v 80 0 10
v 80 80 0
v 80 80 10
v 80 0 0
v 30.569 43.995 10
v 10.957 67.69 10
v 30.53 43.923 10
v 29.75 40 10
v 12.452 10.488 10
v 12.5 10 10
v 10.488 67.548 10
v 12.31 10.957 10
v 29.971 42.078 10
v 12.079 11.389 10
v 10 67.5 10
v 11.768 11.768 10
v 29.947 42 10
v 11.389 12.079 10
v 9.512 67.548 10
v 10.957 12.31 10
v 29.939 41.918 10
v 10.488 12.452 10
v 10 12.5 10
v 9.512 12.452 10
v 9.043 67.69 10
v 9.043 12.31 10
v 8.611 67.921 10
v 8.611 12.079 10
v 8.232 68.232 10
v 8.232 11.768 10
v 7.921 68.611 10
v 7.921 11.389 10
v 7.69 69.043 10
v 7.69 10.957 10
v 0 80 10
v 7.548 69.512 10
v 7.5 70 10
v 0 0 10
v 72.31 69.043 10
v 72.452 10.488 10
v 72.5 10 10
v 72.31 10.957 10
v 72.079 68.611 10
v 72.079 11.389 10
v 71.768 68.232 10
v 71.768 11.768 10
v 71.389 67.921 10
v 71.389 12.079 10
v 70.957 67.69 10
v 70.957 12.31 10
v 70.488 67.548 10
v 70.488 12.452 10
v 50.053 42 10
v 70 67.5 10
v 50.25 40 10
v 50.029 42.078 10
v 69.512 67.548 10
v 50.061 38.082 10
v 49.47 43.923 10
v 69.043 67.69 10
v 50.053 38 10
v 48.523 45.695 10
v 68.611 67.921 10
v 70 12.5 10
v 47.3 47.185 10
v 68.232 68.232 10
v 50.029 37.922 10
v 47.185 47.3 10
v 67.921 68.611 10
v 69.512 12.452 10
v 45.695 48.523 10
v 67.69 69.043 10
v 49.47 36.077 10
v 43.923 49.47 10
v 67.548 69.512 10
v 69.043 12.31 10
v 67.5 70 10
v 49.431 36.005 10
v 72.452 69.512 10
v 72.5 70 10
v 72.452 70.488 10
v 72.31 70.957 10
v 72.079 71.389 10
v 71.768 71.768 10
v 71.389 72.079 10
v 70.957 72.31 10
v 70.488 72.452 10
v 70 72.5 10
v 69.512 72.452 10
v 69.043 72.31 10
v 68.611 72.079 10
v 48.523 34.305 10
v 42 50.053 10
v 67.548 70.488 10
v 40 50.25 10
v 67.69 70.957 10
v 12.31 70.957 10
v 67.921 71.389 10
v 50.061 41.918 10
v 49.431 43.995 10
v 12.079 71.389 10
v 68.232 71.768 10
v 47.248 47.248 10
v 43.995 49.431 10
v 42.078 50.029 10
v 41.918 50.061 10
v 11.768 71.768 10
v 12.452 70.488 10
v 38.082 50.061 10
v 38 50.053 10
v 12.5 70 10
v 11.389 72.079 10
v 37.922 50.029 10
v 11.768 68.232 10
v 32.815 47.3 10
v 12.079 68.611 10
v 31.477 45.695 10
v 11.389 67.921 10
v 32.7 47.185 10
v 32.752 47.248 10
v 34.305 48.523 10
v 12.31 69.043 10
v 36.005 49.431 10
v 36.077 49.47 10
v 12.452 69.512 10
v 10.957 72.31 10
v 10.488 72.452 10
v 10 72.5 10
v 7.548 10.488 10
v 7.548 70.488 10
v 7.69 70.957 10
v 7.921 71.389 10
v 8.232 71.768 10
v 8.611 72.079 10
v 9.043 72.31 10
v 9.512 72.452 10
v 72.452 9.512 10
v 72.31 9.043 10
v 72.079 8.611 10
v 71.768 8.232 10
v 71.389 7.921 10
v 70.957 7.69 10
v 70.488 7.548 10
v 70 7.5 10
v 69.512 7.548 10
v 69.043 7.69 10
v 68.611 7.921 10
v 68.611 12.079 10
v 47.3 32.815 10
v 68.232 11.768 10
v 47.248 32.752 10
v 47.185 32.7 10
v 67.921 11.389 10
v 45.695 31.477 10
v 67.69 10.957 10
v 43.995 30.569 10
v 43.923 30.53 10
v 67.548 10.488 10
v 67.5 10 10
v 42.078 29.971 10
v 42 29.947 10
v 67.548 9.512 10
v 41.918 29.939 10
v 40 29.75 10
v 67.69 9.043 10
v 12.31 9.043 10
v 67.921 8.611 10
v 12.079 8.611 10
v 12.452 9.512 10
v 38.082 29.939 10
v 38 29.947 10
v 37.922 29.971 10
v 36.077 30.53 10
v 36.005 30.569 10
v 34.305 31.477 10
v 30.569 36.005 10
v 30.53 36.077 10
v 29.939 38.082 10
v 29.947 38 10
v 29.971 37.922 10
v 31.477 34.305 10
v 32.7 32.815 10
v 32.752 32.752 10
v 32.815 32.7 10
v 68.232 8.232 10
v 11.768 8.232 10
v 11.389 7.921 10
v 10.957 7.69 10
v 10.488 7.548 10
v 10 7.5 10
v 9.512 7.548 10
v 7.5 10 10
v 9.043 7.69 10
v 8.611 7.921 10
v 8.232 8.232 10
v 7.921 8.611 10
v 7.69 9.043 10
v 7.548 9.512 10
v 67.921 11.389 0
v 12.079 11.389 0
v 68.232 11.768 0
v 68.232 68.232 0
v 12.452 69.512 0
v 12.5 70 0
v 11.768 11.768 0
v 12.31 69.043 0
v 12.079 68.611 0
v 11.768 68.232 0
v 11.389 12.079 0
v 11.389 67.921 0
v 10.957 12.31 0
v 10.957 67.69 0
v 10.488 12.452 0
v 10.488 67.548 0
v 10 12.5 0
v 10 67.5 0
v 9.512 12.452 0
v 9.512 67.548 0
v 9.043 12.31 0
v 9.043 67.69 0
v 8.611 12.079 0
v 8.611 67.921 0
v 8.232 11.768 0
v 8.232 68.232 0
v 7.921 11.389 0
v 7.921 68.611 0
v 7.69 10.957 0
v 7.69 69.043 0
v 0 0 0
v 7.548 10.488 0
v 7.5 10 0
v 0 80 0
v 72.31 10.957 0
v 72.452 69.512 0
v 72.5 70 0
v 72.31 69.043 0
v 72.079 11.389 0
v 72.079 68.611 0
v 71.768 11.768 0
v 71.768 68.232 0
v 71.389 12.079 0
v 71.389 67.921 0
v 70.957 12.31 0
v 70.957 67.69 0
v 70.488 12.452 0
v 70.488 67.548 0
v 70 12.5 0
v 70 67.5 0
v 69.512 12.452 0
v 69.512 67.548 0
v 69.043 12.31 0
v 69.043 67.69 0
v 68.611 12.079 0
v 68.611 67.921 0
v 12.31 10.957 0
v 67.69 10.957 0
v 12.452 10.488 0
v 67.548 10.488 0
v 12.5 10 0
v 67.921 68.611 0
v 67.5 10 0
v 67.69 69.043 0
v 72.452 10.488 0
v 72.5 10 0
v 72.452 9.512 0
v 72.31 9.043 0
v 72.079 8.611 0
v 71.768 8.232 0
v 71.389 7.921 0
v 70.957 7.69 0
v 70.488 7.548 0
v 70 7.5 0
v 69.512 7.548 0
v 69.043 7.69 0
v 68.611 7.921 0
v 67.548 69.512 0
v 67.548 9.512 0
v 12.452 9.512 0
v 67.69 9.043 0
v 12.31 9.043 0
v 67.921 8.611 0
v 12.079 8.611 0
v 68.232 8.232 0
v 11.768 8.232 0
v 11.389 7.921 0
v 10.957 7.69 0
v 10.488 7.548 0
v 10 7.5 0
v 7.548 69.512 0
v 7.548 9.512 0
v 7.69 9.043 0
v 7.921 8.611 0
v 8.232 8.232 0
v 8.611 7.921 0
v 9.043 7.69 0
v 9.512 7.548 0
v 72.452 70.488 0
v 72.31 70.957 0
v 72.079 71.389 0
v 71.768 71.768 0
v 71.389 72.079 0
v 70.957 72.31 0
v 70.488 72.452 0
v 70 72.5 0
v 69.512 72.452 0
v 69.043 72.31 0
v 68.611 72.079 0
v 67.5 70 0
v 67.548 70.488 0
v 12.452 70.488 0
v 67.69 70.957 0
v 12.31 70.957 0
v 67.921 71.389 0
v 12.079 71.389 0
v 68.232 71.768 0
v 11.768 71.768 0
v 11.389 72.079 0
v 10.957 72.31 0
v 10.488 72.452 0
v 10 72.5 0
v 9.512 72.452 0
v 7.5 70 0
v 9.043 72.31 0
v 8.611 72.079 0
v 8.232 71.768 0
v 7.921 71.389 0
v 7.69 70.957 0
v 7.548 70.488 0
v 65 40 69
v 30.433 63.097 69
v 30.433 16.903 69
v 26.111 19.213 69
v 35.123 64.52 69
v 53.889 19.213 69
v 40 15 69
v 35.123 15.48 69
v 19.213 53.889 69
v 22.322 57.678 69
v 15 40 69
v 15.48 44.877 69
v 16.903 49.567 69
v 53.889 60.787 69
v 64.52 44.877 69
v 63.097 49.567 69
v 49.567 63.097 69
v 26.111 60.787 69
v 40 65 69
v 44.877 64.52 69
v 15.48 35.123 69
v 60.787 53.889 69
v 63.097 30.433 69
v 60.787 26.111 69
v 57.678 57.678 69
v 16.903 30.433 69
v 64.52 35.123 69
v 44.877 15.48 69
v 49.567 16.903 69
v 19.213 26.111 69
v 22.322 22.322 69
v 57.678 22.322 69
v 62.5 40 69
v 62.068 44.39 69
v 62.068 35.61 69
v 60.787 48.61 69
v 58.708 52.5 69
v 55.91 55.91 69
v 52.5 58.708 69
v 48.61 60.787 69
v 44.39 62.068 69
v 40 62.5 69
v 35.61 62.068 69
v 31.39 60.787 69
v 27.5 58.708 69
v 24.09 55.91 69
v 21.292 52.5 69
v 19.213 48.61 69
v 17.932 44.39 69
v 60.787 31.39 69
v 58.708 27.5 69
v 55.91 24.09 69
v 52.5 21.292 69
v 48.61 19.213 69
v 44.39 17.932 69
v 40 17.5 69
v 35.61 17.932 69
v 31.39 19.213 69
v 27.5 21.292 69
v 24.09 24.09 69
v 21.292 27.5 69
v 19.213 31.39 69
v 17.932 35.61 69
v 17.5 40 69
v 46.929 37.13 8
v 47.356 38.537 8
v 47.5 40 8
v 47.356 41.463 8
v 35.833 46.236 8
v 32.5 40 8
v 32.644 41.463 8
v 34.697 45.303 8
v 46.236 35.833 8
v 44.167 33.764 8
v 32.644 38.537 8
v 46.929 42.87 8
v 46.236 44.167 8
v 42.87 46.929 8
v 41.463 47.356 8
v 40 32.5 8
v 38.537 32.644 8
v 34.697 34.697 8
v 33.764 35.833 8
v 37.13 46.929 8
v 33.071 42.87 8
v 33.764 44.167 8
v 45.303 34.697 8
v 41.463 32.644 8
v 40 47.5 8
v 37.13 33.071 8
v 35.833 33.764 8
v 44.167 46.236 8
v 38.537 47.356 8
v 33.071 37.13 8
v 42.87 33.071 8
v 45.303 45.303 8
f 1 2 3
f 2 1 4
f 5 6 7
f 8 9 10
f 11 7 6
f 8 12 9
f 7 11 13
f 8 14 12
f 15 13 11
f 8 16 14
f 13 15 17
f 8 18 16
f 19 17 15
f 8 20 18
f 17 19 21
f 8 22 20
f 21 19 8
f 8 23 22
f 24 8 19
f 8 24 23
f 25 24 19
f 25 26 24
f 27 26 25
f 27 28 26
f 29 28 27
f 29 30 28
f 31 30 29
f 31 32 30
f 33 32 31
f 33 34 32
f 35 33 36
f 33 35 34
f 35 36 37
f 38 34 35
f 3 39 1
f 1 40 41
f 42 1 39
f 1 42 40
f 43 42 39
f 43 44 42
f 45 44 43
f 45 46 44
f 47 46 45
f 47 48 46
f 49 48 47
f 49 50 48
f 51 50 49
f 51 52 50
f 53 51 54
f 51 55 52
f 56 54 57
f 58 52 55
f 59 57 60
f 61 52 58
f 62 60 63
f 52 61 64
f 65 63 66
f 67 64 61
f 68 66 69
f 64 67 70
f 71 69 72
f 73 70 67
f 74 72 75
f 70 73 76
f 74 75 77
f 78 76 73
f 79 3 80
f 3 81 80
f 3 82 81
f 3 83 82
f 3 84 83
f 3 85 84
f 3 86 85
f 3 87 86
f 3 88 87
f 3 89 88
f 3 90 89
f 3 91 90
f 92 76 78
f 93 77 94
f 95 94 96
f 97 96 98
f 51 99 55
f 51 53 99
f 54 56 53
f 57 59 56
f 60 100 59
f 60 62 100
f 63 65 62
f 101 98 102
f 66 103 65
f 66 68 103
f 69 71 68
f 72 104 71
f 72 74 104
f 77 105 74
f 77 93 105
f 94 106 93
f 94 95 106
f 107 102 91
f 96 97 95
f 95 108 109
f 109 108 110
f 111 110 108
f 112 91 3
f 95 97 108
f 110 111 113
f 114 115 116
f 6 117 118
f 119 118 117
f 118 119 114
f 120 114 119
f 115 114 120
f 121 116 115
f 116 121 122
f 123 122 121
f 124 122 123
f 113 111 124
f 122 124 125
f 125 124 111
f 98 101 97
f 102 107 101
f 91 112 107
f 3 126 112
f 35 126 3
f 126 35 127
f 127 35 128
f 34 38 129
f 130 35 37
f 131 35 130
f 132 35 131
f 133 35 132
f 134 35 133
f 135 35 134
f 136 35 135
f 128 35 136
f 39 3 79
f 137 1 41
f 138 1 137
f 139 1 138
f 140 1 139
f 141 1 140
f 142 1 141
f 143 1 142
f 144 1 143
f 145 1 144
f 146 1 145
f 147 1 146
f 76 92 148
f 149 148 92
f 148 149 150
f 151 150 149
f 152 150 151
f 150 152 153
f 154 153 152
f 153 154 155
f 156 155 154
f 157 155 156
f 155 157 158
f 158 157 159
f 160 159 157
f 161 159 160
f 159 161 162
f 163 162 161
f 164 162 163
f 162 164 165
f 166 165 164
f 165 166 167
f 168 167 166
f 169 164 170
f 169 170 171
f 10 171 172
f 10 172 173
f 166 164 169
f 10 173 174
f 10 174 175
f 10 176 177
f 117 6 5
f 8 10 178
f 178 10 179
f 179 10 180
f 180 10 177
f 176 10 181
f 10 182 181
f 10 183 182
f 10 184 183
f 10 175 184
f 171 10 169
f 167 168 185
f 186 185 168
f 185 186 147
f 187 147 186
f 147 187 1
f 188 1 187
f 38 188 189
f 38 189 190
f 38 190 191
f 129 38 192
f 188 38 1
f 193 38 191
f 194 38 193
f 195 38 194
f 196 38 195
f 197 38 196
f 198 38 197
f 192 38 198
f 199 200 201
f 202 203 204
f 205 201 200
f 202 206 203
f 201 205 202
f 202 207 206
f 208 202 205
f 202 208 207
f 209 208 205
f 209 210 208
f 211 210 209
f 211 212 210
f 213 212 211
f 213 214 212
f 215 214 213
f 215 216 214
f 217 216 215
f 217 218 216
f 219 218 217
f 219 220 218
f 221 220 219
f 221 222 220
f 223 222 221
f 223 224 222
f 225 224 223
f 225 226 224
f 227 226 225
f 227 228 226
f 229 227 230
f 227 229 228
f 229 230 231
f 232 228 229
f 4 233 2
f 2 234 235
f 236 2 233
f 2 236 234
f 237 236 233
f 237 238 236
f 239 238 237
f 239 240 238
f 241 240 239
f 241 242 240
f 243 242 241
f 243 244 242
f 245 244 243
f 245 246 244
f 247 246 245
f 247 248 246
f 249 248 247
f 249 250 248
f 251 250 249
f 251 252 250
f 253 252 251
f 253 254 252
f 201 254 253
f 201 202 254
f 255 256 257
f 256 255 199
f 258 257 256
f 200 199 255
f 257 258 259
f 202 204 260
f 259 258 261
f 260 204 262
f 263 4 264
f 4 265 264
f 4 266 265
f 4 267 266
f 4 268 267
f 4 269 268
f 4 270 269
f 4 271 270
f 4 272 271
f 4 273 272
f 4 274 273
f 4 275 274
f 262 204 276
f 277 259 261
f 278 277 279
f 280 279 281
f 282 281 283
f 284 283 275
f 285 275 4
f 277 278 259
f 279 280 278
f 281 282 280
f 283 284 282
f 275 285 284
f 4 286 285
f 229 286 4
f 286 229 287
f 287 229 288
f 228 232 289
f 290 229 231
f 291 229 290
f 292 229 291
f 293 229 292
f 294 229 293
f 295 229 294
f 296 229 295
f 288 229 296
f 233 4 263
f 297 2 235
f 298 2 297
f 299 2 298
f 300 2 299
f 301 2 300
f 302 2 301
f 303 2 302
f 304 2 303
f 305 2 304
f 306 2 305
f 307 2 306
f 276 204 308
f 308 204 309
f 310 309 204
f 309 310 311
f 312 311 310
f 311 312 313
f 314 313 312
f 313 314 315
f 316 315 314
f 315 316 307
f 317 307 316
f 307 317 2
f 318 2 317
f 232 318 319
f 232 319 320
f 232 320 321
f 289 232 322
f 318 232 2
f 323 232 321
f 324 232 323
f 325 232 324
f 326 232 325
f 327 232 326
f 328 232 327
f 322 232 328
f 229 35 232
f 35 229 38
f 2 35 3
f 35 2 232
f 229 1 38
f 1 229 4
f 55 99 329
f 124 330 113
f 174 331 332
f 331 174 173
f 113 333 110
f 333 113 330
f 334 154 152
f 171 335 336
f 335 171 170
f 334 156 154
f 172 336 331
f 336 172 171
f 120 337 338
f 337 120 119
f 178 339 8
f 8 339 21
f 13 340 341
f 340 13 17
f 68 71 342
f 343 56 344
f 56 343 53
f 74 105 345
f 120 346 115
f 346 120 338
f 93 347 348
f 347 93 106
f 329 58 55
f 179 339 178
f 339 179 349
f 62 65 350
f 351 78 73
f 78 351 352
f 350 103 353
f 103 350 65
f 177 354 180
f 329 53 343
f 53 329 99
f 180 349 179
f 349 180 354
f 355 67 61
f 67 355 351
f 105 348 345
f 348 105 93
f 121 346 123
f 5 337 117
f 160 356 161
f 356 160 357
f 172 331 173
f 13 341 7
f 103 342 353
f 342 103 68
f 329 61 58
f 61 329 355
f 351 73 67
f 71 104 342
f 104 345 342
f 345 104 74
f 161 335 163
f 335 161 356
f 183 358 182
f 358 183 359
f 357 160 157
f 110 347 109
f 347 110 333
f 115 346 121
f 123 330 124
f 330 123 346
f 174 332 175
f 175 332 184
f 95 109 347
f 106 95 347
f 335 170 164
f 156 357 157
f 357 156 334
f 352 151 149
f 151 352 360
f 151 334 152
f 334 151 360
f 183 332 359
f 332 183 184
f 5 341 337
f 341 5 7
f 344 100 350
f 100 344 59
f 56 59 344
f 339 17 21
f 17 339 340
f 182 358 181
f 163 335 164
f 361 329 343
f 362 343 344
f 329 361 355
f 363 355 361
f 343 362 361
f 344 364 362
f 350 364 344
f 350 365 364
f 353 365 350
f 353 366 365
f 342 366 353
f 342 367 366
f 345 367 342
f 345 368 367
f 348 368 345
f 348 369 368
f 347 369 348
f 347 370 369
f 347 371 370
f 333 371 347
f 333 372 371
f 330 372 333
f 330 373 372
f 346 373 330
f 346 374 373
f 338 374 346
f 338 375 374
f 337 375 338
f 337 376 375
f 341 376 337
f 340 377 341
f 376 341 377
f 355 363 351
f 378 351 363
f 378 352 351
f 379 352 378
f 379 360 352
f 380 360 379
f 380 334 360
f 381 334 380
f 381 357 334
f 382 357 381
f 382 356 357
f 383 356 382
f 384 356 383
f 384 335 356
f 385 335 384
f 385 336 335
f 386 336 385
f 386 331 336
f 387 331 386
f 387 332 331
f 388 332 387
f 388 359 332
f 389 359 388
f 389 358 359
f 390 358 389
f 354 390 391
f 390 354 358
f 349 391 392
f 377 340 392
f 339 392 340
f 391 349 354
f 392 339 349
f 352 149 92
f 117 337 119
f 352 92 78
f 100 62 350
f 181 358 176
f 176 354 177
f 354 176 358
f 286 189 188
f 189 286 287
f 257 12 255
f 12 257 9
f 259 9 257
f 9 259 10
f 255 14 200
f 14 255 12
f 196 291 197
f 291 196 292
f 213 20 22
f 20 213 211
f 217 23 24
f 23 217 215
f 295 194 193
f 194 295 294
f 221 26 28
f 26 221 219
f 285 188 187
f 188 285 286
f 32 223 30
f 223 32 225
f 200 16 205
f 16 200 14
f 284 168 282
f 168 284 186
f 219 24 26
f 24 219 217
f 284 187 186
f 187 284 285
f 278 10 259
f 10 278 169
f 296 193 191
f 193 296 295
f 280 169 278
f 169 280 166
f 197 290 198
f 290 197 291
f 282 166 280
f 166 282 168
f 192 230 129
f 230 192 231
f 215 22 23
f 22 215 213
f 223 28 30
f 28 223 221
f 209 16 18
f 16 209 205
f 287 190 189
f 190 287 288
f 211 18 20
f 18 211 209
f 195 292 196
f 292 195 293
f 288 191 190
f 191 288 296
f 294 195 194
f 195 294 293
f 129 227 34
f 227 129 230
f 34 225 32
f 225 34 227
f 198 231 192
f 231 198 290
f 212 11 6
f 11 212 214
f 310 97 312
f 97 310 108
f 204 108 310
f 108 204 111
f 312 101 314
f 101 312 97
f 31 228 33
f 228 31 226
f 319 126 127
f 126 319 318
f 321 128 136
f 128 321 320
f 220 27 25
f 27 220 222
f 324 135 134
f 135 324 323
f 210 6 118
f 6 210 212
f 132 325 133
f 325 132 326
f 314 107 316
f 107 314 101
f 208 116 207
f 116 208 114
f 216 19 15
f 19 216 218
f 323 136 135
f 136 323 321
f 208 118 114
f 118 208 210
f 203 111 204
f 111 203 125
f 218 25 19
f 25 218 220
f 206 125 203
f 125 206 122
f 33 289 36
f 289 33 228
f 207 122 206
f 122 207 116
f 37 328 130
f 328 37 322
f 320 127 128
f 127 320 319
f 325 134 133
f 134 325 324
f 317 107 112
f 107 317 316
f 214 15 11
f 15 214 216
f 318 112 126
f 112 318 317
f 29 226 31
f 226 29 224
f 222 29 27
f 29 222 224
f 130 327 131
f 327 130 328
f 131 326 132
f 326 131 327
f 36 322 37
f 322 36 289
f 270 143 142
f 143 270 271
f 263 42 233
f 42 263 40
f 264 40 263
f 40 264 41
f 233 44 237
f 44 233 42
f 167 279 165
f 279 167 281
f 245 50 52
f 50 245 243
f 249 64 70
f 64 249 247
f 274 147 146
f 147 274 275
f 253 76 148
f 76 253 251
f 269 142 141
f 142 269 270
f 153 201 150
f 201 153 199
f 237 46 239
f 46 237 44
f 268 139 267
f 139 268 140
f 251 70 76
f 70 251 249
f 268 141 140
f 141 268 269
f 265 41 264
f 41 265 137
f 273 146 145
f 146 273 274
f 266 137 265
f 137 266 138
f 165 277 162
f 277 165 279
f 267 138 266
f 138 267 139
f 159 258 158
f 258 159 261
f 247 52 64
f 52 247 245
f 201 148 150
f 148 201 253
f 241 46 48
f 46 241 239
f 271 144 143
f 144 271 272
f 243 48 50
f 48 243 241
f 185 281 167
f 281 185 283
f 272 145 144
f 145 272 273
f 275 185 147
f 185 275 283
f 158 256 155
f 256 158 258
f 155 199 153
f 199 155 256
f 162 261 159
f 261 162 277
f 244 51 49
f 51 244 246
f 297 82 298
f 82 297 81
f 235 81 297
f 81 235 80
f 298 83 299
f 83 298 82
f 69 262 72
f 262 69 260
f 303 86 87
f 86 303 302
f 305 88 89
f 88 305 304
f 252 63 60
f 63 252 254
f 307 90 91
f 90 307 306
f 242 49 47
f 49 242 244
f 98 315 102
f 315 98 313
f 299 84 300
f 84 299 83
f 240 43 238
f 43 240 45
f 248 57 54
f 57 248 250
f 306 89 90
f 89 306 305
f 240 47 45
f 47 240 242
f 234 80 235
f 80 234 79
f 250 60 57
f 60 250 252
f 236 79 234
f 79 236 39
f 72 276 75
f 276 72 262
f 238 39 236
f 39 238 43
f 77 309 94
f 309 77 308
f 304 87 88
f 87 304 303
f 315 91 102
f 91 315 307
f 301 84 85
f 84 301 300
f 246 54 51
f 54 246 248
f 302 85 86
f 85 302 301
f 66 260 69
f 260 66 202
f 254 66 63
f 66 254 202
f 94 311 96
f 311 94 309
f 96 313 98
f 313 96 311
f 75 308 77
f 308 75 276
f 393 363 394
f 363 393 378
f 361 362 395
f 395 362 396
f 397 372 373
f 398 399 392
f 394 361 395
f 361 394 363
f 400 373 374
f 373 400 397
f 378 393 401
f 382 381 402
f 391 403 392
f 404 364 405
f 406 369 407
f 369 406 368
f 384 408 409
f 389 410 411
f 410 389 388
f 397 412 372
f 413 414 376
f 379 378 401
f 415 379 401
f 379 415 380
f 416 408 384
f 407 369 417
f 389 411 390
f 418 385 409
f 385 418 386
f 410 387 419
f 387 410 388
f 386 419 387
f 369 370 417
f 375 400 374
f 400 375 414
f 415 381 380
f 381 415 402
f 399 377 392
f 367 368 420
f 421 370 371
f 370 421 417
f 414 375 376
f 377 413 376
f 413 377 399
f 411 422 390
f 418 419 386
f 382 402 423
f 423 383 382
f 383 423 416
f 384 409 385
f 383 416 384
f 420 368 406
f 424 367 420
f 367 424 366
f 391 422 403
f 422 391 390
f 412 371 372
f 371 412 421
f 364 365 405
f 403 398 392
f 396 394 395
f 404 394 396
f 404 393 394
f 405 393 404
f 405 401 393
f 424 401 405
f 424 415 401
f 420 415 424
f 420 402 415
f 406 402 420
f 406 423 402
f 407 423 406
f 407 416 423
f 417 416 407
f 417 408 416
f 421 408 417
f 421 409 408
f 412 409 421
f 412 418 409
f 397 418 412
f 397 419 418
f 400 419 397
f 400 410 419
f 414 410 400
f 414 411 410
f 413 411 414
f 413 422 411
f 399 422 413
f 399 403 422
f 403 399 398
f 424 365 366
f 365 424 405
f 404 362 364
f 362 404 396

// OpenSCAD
$fn = 32;

// ----------------------------------------------------------------------
// Hopper: flanged with square flange
// ----------------------------------------------------------------------

// --- parameters (mm) ---
fl = 80;                  // flange side, X and Y
fl_t = 10;                // flange thickness
cone_h = 60;              // cone height above the flange
top_d = 50;               // cone mouth diameter
bot_d = 20;               // cone spout diameter
wall = 2.5;               // cone wall thickness
hole_r = 2.5;             // flange hole radius
hole_in = 10;             // hole inset from the corners
fit_tol = 0.05;           // tolerance for press fits, mm
free_tol = 0.2;           // tolerance for clearance fits, mm

bore_d = bot_d - 2 * wall;  // spout bore diameter
total_h = fl_t + cone_h - 1;  // overall height

difference() {
  union() {
    cube([fl, fl, fl_t]);
    translate([fl / 2, fl / 2, fl_t - 1])
      cylinder(h = cone_h, d1 = bot_d, d2 = top_d);
  }
  translate([fl / 2, fl / 2, fl_t - 2])
    cylinder(h = cone_h + 1, d1 = bore_d, d2 = top_d - 2 * wall);
  for (sx = [0, 1], sy = [0, 1])
    translate([sx ? fl - hole_in : hole_in,
               sy ? fl - hole_in : hole_in, -1])
      cylinder(r = hole_r, h = fl_t + 2);
}
